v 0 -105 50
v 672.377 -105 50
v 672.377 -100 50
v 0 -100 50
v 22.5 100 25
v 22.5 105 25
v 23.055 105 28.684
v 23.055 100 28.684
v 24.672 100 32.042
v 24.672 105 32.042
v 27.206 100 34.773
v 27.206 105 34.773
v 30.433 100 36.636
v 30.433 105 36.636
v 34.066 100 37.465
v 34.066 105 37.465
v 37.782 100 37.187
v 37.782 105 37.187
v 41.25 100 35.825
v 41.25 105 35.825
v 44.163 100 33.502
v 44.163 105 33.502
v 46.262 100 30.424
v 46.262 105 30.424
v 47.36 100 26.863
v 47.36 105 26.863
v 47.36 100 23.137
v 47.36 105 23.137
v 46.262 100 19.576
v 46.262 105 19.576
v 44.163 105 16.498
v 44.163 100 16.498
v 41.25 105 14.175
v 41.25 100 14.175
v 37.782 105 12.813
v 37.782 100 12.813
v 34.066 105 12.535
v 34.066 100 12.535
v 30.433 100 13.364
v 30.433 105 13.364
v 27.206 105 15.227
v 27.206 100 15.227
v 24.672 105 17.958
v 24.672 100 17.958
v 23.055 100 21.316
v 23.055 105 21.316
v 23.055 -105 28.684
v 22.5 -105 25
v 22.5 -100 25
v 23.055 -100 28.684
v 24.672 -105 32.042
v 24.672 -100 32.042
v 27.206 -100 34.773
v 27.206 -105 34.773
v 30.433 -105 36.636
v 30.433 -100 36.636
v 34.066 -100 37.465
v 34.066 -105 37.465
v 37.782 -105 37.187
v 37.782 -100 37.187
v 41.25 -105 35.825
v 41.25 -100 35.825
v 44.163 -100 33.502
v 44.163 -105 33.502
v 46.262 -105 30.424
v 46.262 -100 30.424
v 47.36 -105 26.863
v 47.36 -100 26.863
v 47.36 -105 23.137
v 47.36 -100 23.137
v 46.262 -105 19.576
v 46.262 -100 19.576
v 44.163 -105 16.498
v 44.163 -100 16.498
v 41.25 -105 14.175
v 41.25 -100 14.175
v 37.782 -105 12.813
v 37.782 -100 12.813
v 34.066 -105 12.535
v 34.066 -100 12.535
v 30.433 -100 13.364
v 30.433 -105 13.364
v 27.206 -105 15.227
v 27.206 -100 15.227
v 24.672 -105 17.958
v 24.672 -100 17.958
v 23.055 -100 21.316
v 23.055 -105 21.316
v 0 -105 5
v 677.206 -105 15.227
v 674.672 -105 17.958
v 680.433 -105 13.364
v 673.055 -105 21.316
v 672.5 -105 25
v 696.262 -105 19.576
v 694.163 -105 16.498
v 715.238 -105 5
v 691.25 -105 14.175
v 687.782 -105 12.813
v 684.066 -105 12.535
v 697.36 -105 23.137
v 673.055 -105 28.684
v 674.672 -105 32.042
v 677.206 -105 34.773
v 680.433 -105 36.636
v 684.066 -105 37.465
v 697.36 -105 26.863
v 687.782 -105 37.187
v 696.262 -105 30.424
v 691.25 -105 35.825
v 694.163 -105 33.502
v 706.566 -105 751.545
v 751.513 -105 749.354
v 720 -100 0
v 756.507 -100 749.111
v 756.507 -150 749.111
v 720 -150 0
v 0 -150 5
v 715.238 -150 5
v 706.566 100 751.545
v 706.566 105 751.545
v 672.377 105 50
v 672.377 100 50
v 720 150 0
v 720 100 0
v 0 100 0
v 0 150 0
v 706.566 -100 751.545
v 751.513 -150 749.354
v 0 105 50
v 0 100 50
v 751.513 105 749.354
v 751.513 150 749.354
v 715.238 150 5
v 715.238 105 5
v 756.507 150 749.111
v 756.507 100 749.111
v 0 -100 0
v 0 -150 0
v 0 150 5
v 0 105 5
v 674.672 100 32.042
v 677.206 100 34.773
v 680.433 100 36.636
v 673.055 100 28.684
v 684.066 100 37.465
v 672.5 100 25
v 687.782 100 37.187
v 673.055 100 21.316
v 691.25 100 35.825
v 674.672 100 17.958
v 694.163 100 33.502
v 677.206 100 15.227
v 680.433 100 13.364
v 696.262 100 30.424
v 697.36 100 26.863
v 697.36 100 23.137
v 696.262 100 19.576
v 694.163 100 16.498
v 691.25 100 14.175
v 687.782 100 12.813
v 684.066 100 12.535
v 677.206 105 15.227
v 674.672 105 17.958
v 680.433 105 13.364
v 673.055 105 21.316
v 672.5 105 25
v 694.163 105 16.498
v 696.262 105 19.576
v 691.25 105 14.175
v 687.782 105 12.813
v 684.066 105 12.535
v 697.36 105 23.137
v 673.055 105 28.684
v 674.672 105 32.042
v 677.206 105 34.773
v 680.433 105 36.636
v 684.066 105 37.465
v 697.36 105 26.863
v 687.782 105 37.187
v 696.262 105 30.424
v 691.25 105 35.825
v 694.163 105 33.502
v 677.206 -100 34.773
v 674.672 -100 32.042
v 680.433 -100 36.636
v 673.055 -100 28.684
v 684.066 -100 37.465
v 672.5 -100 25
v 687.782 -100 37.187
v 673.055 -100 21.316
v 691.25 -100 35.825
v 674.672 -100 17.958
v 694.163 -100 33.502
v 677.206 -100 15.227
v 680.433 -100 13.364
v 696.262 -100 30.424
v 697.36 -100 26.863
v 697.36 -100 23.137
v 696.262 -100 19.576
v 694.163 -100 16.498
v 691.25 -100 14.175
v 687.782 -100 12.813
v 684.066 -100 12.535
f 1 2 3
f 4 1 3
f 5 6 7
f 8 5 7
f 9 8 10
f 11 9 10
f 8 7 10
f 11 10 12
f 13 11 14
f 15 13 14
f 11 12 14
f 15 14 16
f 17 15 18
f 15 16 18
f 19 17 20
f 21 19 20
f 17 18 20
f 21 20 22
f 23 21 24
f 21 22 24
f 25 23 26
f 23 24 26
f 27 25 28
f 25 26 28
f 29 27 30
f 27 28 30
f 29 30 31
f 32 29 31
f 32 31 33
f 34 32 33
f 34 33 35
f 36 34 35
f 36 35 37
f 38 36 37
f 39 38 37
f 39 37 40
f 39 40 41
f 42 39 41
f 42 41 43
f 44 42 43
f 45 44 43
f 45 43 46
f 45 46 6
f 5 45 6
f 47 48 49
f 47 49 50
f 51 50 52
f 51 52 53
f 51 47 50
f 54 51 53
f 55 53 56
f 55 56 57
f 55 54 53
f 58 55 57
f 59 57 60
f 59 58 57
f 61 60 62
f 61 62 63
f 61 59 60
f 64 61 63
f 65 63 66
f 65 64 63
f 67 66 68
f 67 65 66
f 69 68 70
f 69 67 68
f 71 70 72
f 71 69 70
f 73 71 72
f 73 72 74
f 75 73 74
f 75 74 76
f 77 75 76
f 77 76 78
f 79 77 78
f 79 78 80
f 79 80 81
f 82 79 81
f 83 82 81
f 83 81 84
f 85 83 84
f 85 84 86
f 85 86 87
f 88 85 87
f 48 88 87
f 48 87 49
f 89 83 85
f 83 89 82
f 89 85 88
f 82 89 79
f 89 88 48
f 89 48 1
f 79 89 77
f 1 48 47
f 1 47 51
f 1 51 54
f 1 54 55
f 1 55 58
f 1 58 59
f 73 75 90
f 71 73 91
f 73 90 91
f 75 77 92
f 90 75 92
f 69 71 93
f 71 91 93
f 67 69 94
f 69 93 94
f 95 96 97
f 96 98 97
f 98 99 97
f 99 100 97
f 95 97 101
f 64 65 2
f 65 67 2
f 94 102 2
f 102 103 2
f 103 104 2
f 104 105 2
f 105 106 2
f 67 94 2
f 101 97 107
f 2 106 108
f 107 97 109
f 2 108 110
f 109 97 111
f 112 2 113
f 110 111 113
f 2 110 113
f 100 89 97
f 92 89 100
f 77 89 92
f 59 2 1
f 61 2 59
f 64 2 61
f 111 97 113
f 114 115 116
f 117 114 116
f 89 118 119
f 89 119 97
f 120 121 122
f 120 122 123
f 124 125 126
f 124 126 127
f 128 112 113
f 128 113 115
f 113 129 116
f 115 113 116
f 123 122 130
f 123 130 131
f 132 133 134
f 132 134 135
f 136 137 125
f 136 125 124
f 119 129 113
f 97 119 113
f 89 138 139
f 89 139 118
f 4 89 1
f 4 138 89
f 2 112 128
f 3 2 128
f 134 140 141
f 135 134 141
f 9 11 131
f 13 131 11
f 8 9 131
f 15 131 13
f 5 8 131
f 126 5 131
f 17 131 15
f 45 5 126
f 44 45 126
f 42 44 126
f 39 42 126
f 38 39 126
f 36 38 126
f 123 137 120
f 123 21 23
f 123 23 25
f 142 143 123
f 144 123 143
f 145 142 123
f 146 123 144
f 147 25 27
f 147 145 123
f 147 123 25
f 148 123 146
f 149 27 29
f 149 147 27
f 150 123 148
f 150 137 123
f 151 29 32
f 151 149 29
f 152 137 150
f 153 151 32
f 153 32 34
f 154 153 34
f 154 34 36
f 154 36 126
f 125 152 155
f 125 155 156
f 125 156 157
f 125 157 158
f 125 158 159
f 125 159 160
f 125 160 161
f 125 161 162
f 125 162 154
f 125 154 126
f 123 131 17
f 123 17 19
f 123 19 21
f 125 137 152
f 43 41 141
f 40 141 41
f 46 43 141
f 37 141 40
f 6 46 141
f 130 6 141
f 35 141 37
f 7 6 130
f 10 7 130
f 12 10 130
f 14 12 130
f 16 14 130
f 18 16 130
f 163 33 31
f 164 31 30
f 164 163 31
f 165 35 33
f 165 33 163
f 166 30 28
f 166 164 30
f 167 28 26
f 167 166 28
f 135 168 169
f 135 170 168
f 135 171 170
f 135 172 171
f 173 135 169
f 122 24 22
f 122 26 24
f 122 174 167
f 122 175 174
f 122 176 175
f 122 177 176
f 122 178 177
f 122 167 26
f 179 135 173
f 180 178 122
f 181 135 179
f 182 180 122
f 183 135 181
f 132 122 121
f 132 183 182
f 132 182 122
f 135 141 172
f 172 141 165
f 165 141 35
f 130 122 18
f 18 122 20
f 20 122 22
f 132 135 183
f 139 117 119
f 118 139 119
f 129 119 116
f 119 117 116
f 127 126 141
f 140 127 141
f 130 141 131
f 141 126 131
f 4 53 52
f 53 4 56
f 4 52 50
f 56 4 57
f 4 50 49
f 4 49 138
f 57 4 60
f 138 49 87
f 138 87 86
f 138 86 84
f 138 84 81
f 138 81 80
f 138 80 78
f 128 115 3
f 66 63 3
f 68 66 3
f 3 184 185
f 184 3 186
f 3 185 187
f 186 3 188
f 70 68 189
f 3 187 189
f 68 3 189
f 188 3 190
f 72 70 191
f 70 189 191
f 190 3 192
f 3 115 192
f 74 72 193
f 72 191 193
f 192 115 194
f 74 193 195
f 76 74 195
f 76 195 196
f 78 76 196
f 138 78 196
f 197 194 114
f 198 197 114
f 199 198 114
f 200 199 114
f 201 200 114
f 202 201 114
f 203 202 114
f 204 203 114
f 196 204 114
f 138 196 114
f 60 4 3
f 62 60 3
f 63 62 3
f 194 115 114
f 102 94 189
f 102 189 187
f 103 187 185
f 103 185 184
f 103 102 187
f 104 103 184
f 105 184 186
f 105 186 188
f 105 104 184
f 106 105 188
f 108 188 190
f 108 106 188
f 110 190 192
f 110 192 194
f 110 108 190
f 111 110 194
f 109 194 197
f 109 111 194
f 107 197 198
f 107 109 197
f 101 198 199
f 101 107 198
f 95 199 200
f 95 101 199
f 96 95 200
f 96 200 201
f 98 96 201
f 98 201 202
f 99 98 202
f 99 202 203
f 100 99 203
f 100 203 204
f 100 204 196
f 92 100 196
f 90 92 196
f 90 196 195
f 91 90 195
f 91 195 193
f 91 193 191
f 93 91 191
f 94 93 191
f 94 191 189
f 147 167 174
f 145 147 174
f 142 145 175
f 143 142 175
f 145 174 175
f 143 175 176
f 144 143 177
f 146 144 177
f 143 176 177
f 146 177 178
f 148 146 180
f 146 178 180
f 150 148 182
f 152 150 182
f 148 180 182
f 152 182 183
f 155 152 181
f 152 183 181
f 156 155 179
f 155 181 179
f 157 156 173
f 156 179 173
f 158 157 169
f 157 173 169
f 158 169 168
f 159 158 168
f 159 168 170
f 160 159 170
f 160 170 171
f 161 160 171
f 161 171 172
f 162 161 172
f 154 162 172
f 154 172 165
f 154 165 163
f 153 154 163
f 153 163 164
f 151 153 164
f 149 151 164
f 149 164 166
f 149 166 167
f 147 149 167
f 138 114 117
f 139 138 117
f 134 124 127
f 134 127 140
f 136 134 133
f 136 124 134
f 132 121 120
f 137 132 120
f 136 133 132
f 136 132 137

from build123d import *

# Parameters (mm, degrees)
F6_D = 25


with BuildPart() as f3:
    # F3: sweep along a path in F2
    with BuildLine(Plane.XZ.offset(-100)) as f3_path:
        Line((0, 0), (720, 0))
        Line((720, 0), (756.5065833717, 749.1109860164))
    # F0 (on Right) → F3 (sweep)
    with BuildSketch(Plane.YZ):
        Polygon((105, 50), (100, 50), (100, 0), (150, 0), (150, 5), (105, 5), align=None)
    sweep(path=f3_path.line, transition=Transition.RIGHT)

    # F6 (through all)
    with Locations(Plane.XZ.offset(-100)):
        with Locations((35, 25), (685, 25)):
            Hole(F6_D / 2)


with BuildPart() as f7_1:
    # F7: instance of F3
    add(f3.part.mirror(Plane.XZ))


solid = Compound([f3.part, f7_1.part])
